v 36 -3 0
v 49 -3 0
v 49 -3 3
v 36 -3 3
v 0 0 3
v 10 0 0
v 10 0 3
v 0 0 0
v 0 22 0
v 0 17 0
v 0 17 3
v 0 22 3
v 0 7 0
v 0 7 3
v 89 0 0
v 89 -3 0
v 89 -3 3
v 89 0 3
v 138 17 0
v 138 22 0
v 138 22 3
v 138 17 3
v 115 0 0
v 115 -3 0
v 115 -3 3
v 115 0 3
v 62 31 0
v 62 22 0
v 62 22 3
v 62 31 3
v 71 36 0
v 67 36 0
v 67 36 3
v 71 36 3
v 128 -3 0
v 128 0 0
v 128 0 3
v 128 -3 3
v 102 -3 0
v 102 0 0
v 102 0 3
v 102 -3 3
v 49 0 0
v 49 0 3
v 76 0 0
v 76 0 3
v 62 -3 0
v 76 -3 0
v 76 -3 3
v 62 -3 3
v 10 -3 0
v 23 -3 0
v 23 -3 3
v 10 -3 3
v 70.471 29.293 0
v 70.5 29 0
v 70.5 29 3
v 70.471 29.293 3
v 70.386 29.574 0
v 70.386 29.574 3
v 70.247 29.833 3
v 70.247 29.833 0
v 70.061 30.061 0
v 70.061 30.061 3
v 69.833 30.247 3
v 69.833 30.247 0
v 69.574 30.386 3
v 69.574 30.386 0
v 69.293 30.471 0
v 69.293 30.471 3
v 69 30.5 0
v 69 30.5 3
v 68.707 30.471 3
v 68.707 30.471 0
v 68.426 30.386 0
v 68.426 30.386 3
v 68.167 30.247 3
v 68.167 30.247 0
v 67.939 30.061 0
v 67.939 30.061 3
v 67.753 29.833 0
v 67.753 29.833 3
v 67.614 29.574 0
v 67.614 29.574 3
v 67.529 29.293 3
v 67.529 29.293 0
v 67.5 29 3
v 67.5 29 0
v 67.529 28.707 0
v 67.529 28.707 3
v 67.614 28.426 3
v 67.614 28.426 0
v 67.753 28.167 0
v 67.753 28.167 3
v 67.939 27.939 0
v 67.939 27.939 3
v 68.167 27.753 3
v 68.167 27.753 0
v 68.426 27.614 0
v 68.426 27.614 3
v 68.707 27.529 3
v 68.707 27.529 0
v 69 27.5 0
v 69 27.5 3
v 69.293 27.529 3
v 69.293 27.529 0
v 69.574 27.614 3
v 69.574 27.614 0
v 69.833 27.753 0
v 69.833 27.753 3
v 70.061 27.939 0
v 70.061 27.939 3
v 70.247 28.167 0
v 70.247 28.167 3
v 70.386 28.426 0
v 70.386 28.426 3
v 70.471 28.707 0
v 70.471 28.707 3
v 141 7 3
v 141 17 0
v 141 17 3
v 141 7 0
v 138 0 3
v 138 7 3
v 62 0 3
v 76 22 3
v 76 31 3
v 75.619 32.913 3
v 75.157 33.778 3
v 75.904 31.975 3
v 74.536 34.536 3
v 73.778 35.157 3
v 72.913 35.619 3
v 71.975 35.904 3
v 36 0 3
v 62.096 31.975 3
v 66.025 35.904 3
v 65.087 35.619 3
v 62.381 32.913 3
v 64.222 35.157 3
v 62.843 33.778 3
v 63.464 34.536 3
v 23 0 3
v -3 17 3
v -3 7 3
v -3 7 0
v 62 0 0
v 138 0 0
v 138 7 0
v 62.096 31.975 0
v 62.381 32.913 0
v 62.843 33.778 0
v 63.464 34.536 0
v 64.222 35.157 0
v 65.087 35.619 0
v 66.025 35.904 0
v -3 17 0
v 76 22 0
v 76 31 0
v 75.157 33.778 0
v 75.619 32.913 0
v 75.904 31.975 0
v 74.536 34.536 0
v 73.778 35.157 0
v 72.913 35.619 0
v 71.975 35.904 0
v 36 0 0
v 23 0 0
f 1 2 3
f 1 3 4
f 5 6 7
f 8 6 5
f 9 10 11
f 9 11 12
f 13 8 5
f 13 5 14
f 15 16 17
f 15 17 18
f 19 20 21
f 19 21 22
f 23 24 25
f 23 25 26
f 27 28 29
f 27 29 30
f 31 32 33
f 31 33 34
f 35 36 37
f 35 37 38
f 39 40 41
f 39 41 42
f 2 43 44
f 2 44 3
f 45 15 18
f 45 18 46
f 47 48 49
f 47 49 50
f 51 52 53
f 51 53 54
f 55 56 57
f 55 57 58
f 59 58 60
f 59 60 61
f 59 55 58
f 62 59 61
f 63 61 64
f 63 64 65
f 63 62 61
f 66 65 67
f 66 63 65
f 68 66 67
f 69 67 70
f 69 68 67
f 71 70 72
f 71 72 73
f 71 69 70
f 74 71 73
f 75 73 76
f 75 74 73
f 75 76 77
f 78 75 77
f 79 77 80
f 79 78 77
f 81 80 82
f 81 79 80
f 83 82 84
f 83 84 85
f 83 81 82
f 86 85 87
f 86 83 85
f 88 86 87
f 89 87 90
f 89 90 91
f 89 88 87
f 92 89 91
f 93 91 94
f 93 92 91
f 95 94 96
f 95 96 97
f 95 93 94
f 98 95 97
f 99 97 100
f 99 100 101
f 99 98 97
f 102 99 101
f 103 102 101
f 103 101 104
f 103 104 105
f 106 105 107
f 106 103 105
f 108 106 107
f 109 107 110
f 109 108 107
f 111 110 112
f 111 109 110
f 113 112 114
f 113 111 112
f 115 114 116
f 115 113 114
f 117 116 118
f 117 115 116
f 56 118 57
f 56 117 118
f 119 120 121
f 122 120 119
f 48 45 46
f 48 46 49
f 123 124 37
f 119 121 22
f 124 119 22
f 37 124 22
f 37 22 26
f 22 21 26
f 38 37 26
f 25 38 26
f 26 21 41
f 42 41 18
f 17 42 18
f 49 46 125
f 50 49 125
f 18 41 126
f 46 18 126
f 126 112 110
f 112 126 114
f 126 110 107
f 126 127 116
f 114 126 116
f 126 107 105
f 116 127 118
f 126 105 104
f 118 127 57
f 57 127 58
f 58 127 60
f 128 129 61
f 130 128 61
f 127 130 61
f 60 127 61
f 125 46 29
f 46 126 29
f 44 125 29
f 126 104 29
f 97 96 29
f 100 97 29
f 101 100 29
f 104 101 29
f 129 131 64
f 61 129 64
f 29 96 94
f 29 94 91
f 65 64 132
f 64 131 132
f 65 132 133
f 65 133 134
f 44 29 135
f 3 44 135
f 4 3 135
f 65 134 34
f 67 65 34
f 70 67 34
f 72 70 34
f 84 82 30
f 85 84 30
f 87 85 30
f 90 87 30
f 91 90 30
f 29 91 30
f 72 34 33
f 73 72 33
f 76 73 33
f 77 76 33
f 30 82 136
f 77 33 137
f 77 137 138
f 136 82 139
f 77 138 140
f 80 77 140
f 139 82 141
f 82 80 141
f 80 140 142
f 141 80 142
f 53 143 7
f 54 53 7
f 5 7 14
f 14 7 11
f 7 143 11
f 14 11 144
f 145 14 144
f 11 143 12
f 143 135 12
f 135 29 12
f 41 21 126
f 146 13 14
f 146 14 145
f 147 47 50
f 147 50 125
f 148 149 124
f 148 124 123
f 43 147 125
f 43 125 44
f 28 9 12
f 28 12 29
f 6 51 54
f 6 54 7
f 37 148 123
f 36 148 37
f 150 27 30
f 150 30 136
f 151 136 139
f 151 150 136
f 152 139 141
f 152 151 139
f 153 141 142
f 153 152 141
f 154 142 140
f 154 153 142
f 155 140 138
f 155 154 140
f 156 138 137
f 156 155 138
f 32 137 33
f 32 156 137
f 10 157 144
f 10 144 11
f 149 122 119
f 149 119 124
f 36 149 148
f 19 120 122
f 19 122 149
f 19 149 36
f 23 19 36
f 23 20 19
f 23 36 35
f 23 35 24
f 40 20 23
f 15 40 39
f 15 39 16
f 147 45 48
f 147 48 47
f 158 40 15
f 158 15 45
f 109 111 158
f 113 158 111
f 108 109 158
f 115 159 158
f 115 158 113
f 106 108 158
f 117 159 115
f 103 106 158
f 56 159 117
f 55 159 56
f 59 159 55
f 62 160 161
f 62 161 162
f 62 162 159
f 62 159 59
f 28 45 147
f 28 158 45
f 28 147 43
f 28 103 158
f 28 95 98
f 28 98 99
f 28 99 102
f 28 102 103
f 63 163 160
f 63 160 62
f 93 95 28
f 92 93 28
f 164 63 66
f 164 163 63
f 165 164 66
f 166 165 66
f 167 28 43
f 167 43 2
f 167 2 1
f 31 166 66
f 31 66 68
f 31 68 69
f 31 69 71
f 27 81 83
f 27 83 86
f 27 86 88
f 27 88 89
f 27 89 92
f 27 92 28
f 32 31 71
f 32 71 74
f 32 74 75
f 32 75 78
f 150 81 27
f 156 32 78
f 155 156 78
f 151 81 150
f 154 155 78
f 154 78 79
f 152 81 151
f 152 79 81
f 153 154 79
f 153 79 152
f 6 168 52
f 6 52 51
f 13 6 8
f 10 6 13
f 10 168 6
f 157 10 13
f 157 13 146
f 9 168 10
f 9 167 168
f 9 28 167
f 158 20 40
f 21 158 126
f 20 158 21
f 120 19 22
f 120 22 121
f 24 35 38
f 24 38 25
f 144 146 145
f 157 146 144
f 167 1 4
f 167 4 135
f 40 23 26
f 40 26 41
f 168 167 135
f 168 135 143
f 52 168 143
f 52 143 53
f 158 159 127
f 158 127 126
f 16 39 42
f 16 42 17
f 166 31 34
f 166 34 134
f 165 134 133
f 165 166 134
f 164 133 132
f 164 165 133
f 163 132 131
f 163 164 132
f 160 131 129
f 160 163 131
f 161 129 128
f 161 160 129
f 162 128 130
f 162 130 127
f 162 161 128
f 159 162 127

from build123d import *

# Parameters (mm, degrees)
SKETCH1_R           = 1.5
BOSS_EXTRUDE1_DEPTH = 3


with BuildPart() as part:
    # Sketch1 → Boss-Extrude1 (new body)
    with BuildSketch(Plane.XY):
        with BuildLine():
            Line((0, 17), (0, 22))
            Line((0, 22), (62, 22))
            Line((62, 22), (62, 31))
            ThreePointArc((62, 31), (63.464466094, 34.535533906), (67, 36))
            Line((67, 36), (71, 36))
            ThreePointArc((71, 36), (74.535533906, 34.535533906), (76, 31))
            Line((76, 31), (76, 22))
            Line((76, 22), (138, 22))
            Line((138, 22), (138, 17))
            Line((138, 17), (141, 17))
            Line((141, 17), (141, 7))
            Line((141, 7), (138, 7))
            Line((138, 7), (138, 0))
            Line((138, 0), (128, 0))
            Line((128, 0), (128, -3))
            Line((128, -3), (115, -3))
            Line((115, -3), (115, 0))
            Line((115, 0), (102, 0))
            Line((102, 0), (102, -3))
            Line((102, -3), (89, -3))
            Line((89, -3), (89, 0))
            Line((89, 0), (76, 0))
            Line((76, 0), (76, -3))
            Line((76, -3), (62, -3))
            Line((62, -3), (62, 0))
            Line((62, 0), (49, 0))
            Line((49, 0), (49, -3))
            Line((49, -3), (36, -3))
            Line((36, -3), (36, 0))
            Line((36, 0), (23, 0))
            Line((23, 0), (23, -3))
            Line((23, -3), (10, -3))
            Line((10, -3), (10, 0))
            Line((10, 0), (0, 0))
            Line((0, 0), (0, 7))
            Line((0, 7), (-3, 7))
            Line((-3, 7), (-3, 17))
            Line((-3, 17), (0, 17))
        make_face()
        with Locations((69, 29)):
            Circle(SKETCH1_R, mode=Mode.SUBTRACT)
    extrude(amount=BOSS_EXTRUDE1_DEPTH)


solid = part.part
